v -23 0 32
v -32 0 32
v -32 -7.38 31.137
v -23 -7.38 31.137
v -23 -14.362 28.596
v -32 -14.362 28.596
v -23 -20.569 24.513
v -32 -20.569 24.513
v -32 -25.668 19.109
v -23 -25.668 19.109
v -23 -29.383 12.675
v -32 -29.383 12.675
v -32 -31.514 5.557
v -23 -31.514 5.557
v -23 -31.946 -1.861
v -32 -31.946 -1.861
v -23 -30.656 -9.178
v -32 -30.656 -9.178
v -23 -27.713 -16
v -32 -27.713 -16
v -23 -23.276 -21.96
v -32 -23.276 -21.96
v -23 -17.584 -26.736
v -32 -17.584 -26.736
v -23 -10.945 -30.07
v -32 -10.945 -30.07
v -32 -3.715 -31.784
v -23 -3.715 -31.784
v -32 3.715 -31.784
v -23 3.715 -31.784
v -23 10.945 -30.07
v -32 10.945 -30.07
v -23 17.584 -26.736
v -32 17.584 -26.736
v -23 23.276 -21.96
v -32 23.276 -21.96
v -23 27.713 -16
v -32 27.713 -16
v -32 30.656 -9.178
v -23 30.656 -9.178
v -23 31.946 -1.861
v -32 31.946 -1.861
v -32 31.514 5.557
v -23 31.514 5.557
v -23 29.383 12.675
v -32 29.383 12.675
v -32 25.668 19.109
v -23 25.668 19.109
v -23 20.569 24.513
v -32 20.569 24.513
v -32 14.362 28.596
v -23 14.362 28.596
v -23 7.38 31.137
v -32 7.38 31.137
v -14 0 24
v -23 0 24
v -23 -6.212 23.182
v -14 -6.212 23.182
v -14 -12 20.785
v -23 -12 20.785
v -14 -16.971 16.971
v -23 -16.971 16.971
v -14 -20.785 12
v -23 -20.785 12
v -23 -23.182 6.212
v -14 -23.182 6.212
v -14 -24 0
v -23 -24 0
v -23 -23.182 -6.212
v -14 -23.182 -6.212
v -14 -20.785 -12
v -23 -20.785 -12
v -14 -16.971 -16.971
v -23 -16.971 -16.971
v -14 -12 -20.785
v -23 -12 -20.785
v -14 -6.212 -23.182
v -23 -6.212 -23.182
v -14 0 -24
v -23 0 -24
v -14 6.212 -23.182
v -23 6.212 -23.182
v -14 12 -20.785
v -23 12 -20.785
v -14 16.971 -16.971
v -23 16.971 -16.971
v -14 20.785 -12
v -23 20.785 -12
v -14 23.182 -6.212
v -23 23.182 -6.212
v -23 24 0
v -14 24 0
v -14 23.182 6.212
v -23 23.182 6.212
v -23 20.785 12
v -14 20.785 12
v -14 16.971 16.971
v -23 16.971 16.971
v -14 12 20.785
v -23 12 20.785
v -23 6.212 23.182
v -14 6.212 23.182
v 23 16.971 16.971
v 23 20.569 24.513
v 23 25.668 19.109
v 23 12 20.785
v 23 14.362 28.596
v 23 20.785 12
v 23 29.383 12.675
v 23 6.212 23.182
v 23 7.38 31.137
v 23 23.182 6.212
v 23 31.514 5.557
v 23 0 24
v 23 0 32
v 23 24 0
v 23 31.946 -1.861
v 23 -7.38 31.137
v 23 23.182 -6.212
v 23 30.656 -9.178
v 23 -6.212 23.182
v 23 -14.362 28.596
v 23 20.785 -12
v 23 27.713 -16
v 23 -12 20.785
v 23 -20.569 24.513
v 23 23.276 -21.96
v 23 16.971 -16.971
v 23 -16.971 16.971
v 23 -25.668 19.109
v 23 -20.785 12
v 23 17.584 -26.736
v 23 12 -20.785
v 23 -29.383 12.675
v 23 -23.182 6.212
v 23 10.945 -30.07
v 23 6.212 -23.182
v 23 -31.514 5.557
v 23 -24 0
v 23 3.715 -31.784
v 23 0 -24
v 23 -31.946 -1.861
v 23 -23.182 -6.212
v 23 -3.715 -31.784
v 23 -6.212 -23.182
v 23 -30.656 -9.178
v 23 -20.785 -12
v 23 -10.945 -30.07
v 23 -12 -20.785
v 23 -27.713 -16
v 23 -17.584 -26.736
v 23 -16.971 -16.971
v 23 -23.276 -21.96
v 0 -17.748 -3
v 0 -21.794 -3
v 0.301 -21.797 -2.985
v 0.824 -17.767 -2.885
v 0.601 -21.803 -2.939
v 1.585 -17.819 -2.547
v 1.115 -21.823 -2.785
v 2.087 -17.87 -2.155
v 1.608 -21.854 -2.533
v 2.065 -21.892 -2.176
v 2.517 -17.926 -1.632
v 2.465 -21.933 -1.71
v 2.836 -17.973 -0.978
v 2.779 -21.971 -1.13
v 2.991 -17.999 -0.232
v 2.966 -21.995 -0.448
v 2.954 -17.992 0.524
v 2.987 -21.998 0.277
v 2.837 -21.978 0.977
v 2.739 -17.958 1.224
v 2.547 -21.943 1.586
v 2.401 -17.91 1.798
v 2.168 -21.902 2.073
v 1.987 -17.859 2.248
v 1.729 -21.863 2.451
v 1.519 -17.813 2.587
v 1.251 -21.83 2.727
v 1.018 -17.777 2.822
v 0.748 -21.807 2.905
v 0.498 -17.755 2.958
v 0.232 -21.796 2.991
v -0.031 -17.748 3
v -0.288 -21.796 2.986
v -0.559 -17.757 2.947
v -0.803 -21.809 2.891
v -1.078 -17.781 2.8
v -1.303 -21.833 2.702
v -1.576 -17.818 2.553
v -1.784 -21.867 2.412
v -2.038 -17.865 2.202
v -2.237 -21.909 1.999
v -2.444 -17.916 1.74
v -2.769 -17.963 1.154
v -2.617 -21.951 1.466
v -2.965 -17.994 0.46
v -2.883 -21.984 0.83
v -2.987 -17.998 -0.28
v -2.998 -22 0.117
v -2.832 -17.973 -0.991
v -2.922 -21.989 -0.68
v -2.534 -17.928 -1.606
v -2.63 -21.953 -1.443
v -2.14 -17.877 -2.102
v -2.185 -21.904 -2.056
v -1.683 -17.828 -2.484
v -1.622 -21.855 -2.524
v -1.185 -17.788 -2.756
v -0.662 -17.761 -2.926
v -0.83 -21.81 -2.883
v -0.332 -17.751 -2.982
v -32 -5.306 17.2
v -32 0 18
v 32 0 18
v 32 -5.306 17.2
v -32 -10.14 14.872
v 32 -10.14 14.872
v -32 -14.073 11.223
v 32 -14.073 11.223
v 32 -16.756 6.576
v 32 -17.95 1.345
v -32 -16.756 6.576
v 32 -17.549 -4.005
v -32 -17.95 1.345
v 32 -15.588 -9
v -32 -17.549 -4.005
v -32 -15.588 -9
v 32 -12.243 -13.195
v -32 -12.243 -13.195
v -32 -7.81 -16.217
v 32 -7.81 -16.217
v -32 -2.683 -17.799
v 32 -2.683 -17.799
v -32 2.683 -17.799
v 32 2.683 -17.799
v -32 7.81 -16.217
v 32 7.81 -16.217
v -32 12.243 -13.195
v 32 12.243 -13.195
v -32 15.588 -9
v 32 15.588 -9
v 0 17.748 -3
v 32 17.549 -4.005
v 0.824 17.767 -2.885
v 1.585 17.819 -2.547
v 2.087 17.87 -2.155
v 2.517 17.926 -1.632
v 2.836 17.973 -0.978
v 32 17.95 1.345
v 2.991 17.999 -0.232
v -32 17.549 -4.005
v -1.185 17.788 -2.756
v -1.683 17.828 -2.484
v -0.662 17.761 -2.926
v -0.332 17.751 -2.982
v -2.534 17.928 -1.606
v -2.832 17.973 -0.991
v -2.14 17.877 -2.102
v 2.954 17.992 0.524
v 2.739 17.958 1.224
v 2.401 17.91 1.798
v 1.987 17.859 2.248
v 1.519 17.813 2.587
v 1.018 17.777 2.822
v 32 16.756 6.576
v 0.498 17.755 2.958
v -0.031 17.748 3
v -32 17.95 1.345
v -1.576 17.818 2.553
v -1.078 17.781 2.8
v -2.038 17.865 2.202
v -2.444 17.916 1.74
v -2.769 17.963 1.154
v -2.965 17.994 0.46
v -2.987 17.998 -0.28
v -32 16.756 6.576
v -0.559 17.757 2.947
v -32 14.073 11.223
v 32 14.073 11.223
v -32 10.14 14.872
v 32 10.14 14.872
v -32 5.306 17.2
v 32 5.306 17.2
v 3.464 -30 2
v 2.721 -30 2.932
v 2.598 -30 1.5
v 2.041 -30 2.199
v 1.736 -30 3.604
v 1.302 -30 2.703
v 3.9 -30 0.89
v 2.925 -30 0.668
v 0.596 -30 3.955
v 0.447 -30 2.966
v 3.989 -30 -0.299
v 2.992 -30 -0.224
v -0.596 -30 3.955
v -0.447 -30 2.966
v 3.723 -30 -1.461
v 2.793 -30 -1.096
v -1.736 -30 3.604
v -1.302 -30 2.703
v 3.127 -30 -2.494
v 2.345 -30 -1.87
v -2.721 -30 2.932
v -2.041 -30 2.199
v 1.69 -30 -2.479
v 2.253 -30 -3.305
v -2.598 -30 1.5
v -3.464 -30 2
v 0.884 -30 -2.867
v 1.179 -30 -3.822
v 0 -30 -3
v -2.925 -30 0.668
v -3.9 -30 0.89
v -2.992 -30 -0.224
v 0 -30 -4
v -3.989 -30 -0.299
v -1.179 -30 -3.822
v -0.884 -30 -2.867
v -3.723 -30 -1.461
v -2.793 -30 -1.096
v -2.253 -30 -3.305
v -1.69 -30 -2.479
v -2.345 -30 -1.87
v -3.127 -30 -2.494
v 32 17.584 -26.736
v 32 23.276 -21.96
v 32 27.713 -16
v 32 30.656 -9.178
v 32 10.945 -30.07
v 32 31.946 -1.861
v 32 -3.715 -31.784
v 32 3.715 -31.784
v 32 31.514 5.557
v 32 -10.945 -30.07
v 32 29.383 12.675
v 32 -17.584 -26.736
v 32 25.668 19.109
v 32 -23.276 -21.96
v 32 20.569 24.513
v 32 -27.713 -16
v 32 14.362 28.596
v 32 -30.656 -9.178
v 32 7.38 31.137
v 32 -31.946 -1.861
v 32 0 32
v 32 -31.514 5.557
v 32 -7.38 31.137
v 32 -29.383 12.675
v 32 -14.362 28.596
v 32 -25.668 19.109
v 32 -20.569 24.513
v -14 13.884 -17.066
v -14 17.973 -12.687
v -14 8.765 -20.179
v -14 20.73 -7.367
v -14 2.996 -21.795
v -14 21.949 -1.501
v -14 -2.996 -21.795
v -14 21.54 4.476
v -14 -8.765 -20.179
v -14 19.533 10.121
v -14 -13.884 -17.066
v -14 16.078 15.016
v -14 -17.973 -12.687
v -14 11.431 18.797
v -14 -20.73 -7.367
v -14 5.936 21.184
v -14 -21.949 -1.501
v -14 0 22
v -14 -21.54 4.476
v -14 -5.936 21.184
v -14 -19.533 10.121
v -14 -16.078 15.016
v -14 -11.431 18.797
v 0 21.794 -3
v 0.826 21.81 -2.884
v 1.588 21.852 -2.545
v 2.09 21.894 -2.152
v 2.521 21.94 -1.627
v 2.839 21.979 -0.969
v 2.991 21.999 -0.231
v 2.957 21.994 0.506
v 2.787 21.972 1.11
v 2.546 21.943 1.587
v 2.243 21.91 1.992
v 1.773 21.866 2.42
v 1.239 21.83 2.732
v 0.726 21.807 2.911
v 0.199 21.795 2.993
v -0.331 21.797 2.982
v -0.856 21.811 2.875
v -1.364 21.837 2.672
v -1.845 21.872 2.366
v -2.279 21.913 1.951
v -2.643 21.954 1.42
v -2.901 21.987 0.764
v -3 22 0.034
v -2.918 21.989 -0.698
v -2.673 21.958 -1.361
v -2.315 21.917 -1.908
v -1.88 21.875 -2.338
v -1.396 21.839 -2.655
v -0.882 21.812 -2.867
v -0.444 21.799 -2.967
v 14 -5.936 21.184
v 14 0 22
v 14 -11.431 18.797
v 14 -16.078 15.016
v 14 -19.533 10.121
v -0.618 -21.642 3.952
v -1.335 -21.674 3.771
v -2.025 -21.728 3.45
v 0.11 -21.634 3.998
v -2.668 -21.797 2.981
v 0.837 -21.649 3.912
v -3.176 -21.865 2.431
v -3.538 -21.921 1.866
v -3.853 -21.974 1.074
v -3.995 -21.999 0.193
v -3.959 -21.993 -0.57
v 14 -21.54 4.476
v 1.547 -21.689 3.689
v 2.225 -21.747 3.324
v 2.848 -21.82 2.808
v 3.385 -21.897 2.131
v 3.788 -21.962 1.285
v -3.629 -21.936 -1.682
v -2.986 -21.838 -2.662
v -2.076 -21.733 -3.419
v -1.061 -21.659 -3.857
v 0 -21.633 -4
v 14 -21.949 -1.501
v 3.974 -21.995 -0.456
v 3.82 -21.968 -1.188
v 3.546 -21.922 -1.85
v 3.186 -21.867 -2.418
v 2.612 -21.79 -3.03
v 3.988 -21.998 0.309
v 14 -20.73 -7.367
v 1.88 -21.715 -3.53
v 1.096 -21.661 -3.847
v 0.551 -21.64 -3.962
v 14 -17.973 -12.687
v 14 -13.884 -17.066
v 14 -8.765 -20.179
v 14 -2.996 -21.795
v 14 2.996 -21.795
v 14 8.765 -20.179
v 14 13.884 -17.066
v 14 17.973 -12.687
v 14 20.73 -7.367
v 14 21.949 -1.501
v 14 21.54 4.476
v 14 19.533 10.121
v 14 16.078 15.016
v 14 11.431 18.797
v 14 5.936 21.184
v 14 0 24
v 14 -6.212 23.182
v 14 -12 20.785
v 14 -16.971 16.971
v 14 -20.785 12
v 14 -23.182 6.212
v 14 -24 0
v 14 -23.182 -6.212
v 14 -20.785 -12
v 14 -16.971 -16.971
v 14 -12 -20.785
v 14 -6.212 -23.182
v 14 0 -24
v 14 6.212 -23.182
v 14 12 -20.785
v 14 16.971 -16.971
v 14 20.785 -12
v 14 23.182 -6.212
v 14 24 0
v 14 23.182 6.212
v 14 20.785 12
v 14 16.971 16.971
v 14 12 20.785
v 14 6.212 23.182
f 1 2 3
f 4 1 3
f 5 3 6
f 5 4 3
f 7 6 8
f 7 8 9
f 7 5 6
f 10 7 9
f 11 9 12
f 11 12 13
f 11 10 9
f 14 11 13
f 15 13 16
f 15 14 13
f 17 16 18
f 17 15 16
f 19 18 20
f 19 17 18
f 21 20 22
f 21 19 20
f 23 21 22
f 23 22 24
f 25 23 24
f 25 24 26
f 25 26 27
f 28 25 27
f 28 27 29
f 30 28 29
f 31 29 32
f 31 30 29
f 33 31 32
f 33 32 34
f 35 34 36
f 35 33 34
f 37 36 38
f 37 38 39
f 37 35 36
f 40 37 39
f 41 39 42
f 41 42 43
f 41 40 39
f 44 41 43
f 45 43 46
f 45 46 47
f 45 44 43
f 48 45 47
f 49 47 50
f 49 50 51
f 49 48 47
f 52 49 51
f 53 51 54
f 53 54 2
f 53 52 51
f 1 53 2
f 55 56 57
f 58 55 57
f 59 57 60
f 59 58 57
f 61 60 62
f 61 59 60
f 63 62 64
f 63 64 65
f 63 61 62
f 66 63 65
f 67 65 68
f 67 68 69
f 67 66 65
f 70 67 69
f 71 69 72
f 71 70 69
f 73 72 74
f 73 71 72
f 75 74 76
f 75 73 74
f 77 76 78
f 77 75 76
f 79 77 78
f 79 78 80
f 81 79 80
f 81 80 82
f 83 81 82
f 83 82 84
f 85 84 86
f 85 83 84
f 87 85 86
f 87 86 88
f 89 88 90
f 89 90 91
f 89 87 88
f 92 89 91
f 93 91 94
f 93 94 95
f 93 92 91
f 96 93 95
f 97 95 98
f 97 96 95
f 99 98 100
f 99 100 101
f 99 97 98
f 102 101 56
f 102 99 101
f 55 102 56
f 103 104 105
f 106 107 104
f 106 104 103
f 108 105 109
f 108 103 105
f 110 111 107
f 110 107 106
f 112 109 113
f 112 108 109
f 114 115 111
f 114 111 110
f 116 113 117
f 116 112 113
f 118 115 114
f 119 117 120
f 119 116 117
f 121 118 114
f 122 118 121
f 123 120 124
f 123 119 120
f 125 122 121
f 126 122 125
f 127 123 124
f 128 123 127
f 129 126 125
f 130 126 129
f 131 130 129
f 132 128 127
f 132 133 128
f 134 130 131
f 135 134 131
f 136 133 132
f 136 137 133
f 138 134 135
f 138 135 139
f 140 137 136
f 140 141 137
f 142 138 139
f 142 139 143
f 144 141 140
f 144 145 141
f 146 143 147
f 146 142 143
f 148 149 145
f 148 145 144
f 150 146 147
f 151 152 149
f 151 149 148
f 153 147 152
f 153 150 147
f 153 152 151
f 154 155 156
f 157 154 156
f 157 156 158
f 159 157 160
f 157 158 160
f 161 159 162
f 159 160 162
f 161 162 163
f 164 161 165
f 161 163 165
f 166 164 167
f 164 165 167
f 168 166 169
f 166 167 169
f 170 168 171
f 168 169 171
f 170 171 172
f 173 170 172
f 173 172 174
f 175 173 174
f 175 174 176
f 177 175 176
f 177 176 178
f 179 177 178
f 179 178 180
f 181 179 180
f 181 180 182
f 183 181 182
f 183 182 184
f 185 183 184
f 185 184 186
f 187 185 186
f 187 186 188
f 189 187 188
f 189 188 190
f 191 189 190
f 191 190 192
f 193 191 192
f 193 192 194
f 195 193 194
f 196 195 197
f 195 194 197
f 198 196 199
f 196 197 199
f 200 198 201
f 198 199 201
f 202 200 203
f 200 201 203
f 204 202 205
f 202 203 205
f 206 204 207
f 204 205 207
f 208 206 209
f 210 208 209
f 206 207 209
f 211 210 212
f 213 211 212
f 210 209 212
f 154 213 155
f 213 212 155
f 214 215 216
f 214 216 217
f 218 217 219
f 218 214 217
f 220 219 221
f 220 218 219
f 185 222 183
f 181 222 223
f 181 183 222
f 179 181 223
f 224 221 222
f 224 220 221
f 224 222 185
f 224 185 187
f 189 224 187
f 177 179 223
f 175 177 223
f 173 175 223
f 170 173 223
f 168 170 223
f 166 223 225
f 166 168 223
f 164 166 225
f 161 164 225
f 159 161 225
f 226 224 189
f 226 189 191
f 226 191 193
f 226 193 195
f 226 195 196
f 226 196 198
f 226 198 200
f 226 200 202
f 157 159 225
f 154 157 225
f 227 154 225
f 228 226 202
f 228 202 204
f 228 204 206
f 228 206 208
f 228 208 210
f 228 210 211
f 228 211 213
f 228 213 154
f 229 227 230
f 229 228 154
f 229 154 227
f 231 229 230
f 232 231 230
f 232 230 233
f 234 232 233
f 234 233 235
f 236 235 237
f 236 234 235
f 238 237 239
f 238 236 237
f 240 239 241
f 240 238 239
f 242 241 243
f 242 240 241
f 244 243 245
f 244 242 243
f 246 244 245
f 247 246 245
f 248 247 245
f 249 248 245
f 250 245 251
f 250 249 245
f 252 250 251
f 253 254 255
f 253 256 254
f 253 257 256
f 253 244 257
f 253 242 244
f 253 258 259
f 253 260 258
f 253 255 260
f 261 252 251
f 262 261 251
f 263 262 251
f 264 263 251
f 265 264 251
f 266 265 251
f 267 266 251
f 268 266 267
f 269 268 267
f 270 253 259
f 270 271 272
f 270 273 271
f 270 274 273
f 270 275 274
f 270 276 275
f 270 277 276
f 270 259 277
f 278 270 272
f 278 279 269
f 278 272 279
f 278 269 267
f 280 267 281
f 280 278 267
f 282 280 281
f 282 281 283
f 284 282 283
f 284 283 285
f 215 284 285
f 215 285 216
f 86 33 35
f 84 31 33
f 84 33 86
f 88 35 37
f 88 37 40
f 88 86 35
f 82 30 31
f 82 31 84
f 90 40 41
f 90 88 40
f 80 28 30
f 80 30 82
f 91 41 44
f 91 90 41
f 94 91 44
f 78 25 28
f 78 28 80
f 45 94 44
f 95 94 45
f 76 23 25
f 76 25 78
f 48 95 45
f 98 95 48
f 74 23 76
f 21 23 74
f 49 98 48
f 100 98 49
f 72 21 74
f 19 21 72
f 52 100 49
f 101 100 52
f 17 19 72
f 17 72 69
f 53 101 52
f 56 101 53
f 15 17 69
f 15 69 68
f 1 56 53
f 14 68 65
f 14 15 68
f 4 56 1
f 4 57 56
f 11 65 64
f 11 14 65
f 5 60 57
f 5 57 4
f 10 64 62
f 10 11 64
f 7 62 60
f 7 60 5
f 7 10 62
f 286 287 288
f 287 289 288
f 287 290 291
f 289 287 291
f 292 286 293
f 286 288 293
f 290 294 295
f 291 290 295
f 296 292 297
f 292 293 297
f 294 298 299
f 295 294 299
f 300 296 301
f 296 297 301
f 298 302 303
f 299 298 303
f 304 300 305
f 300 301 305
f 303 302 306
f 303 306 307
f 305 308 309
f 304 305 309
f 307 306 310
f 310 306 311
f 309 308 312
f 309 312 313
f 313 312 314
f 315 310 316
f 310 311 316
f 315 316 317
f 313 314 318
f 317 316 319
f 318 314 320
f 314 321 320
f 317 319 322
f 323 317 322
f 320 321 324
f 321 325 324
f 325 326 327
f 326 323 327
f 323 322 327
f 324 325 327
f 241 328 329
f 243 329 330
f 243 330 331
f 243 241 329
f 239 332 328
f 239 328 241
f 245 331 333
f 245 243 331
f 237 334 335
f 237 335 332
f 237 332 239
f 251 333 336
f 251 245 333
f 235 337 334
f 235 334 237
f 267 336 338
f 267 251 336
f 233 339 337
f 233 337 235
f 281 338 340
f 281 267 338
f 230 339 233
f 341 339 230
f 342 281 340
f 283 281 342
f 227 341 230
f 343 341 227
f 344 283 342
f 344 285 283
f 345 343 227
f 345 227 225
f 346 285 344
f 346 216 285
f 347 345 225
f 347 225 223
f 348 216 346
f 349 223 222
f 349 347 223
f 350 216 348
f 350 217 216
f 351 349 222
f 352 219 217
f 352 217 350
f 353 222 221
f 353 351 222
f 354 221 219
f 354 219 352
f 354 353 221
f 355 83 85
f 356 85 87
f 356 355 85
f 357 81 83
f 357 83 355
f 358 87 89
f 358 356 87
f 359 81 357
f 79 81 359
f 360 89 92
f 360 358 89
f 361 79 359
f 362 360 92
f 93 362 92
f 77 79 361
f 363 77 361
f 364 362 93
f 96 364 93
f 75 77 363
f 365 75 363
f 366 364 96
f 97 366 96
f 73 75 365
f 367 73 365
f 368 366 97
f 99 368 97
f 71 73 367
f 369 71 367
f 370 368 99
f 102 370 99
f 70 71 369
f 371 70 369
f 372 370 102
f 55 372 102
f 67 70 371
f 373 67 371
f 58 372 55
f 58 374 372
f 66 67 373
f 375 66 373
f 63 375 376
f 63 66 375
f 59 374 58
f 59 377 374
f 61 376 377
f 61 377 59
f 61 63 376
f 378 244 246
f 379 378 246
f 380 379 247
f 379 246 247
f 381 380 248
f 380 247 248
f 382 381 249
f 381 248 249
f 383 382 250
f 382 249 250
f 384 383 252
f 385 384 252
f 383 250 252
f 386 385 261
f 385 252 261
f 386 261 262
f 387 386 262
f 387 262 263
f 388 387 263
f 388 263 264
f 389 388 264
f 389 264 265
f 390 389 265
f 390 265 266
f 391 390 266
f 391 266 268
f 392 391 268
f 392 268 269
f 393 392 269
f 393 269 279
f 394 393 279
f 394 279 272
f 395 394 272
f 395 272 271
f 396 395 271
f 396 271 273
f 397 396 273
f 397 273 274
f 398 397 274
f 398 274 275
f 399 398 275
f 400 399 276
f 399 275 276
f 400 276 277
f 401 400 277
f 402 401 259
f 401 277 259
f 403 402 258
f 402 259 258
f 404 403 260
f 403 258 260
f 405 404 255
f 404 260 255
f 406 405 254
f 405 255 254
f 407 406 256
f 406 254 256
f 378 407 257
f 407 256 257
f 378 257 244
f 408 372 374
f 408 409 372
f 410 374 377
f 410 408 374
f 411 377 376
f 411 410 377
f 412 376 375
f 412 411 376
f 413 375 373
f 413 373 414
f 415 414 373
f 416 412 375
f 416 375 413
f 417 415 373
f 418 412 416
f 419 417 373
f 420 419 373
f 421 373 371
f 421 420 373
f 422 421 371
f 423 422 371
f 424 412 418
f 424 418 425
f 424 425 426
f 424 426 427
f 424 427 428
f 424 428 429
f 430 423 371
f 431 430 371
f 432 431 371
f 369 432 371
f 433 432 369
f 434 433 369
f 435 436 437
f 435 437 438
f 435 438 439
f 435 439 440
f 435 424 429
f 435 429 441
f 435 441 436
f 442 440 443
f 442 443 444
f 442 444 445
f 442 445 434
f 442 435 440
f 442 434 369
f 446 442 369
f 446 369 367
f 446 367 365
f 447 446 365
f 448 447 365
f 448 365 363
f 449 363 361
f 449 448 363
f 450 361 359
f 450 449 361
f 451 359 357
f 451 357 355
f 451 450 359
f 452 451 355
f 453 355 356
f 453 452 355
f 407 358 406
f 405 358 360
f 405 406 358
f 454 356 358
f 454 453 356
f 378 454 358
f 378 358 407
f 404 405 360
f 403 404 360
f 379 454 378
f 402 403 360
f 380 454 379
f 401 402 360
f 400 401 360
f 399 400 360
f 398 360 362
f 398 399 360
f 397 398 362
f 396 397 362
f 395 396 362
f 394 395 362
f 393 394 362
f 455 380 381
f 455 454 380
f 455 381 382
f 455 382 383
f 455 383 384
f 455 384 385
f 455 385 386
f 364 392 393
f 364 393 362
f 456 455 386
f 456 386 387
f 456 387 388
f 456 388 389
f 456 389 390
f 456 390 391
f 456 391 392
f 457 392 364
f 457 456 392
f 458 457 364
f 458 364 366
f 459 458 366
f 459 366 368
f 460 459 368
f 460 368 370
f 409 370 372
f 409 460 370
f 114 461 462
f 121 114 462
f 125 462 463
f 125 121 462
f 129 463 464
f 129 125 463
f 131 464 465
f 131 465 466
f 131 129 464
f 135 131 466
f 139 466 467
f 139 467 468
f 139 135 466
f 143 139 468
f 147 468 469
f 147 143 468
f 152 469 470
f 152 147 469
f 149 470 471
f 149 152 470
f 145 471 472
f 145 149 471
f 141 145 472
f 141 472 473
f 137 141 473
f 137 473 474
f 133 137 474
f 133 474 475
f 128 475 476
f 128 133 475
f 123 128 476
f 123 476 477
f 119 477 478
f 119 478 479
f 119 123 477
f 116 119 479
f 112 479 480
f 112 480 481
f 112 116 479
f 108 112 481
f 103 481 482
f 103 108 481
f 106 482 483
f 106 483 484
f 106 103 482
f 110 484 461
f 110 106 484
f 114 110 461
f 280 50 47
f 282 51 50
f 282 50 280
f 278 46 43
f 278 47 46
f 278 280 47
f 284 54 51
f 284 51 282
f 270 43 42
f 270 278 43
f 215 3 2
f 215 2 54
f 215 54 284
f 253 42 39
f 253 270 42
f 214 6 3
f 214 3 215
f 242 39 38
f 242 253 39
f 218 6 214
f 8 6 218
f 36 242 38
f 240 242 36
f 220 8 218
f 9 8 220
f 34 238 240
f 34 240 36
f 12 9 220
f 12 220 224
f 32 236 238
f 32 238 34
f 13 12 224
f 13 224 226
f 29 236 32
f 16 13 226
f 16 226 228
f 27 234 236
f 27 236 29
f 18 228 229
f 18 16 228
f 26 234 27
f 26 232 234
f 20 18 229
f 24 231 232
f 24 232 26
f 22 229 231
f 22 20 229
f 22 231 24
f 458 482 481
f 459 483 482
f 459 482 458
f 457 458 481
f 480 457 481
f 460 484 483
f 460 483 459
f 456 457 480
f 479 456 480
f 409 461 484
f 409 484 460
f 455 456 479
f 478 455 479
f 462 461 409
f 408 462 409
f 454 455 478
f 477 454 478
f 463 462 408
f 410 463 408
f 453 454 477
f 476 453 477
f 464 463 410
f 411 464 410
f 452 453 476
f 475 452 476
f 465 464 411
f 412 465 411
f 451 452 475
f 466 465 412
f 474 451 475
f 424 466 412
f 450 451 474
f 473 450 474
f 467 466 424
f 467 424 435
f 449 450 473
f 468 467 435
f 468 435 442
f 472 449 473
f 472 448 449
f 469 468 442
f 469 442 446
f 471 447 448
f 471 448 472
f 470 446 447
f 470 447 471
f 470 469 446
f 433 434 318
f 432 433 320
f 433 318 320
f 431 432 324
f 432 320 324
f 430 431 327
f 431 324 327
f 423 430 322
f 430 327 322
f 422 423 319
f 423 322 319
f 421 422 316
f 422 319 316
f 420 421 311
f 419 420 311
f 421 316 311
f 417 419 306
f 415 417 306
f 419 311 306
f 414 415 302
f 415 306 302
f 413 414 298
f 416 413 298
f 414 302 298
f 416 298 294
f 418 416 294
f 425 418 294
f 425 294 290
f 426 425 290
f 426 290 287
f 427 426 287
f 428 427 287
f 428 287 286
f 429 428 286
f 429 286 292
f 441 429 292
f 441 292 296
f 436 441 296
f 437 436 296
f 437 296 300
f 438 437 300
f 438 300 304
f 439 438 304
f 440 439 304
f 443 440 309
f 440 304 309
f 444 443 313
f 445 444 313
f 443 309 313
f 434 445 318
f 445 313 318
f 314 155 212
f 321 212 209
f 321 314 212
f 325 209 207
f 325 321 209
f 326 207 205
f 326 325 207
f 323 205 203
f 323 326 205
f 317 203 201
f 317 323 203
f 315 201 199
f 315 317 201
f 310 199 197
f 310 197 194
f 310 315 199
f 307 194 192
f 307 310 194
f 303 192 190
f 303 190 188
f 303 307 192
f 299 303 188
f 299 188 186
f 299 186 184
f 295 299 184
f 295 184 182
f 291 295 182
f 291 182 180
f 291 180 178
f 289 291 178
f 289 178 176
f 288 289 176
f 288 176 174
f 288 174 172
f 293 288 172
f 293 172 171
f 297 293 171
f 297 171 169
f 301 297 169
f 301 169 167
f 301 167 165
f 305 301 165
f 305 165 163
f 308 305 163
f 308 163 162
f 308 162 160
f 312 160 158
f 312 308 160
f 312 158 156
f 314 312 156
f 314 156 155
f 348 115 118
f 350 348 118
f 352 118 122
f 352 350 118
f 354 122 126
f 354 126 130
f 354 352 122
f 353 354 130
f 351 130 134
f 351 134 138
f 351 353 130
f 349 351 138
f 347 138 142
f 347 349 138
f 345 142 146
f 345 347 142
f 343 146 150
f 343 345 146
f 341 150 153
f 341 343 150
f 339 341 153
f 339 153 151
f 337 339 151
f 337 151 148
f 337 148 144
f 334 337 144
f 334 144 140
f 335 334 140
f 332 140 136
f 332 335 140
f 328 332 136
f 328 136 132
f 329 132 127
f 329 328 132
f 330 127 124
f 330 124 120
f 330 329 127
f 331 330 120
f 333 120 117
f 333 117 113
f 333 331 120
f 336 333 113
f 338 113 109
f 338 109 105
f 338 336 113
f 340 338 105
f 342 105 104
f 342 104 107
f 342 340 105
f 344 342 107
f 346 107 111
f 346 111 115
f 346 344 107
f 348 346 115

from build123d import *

# Parameters (mm, degrees)
BOSS_EXTRUDE1_REACH      = 78.759
BOSS_EXTRUDE1_END_RADIUS = 22
SKETCH2_R                = 4
SKETCH2_R_2              = 3
SKETCH3_R                = 3
CUT_EXTRUDE1_DEPTH       = 77.75936425


with BuildPart() as part:
    # Sketch1 → Revolve1 (revolve)
    with BuildSketch(Plane.XY, mode=Mode.PRIVATE) as revolve1_sk:
        Polygon((-32, 18), (-32, 32), (-23, 32), (-23, 24), (-14, 24), (-14, 22), (14, 22), (14, 24), (23, 24), (23, 32), (32, 32), (32, 18), align=None)
    revolve(revolve1_sk.sketch.rotate(Axis((-55.697732997, 0, 0), (1, 0, 0)), 90), axis=Axis((-55.697732997, 0, 0), (1, 0, 0)))

    # Boss-Extrude1: up to this cylinder (the profile starts outside it)
    boss_extrude1_end = Plane(origin=(0, 0, 0), z_dir=(-1, 0, 0)) * Cylinder(BOSS_EXTRUDE1_END_RADIUS, 202.518, mode=Mode.PRIVATE)
    # Sketch2 → Boss-Extrude1 (add, up to the surface)
    with BuildSketch(Plane(origin=(0, -30, 0), x_dir=(1, 0, 0), z_dir=(0, 1, 0)), mode=Mode.PRIVATE) as boss_extrude1_sk1:
        with Locations(Location((0, 0, 0), (0, 0, 90))):
            Circle(SKETCH2_R)
        with Locations(Location((0, 0, 0), (0, 0, 90))):
            Circle(SKETCH2_R_2, mode=Mode.SUBTRACT)
    boss_extrude1_tool1 = extrude(boss_extrude1_sk1.sketch, amount=BOSS_EXTRUDE1_REACH, mode=Mode.PRIVATE) - boss_extrude1_end
    add(boss_extrude1_tool1.solids().sort_by_distance((0, -30, 3.886863))[0])

    # Sketch3 → Cut-Extrude1 (cut, through all)
    with BuildSketch(Plane.XZ.offset(30)):
        with Locations(Location((0, 0, 0), (0, 0, 270))):
            Circle(SKETCH3_R)
    extrude(amount=-CUT_EXTRUDE1_DEPTH, mode=Mode.SUBTRACT)


solid = part.part
